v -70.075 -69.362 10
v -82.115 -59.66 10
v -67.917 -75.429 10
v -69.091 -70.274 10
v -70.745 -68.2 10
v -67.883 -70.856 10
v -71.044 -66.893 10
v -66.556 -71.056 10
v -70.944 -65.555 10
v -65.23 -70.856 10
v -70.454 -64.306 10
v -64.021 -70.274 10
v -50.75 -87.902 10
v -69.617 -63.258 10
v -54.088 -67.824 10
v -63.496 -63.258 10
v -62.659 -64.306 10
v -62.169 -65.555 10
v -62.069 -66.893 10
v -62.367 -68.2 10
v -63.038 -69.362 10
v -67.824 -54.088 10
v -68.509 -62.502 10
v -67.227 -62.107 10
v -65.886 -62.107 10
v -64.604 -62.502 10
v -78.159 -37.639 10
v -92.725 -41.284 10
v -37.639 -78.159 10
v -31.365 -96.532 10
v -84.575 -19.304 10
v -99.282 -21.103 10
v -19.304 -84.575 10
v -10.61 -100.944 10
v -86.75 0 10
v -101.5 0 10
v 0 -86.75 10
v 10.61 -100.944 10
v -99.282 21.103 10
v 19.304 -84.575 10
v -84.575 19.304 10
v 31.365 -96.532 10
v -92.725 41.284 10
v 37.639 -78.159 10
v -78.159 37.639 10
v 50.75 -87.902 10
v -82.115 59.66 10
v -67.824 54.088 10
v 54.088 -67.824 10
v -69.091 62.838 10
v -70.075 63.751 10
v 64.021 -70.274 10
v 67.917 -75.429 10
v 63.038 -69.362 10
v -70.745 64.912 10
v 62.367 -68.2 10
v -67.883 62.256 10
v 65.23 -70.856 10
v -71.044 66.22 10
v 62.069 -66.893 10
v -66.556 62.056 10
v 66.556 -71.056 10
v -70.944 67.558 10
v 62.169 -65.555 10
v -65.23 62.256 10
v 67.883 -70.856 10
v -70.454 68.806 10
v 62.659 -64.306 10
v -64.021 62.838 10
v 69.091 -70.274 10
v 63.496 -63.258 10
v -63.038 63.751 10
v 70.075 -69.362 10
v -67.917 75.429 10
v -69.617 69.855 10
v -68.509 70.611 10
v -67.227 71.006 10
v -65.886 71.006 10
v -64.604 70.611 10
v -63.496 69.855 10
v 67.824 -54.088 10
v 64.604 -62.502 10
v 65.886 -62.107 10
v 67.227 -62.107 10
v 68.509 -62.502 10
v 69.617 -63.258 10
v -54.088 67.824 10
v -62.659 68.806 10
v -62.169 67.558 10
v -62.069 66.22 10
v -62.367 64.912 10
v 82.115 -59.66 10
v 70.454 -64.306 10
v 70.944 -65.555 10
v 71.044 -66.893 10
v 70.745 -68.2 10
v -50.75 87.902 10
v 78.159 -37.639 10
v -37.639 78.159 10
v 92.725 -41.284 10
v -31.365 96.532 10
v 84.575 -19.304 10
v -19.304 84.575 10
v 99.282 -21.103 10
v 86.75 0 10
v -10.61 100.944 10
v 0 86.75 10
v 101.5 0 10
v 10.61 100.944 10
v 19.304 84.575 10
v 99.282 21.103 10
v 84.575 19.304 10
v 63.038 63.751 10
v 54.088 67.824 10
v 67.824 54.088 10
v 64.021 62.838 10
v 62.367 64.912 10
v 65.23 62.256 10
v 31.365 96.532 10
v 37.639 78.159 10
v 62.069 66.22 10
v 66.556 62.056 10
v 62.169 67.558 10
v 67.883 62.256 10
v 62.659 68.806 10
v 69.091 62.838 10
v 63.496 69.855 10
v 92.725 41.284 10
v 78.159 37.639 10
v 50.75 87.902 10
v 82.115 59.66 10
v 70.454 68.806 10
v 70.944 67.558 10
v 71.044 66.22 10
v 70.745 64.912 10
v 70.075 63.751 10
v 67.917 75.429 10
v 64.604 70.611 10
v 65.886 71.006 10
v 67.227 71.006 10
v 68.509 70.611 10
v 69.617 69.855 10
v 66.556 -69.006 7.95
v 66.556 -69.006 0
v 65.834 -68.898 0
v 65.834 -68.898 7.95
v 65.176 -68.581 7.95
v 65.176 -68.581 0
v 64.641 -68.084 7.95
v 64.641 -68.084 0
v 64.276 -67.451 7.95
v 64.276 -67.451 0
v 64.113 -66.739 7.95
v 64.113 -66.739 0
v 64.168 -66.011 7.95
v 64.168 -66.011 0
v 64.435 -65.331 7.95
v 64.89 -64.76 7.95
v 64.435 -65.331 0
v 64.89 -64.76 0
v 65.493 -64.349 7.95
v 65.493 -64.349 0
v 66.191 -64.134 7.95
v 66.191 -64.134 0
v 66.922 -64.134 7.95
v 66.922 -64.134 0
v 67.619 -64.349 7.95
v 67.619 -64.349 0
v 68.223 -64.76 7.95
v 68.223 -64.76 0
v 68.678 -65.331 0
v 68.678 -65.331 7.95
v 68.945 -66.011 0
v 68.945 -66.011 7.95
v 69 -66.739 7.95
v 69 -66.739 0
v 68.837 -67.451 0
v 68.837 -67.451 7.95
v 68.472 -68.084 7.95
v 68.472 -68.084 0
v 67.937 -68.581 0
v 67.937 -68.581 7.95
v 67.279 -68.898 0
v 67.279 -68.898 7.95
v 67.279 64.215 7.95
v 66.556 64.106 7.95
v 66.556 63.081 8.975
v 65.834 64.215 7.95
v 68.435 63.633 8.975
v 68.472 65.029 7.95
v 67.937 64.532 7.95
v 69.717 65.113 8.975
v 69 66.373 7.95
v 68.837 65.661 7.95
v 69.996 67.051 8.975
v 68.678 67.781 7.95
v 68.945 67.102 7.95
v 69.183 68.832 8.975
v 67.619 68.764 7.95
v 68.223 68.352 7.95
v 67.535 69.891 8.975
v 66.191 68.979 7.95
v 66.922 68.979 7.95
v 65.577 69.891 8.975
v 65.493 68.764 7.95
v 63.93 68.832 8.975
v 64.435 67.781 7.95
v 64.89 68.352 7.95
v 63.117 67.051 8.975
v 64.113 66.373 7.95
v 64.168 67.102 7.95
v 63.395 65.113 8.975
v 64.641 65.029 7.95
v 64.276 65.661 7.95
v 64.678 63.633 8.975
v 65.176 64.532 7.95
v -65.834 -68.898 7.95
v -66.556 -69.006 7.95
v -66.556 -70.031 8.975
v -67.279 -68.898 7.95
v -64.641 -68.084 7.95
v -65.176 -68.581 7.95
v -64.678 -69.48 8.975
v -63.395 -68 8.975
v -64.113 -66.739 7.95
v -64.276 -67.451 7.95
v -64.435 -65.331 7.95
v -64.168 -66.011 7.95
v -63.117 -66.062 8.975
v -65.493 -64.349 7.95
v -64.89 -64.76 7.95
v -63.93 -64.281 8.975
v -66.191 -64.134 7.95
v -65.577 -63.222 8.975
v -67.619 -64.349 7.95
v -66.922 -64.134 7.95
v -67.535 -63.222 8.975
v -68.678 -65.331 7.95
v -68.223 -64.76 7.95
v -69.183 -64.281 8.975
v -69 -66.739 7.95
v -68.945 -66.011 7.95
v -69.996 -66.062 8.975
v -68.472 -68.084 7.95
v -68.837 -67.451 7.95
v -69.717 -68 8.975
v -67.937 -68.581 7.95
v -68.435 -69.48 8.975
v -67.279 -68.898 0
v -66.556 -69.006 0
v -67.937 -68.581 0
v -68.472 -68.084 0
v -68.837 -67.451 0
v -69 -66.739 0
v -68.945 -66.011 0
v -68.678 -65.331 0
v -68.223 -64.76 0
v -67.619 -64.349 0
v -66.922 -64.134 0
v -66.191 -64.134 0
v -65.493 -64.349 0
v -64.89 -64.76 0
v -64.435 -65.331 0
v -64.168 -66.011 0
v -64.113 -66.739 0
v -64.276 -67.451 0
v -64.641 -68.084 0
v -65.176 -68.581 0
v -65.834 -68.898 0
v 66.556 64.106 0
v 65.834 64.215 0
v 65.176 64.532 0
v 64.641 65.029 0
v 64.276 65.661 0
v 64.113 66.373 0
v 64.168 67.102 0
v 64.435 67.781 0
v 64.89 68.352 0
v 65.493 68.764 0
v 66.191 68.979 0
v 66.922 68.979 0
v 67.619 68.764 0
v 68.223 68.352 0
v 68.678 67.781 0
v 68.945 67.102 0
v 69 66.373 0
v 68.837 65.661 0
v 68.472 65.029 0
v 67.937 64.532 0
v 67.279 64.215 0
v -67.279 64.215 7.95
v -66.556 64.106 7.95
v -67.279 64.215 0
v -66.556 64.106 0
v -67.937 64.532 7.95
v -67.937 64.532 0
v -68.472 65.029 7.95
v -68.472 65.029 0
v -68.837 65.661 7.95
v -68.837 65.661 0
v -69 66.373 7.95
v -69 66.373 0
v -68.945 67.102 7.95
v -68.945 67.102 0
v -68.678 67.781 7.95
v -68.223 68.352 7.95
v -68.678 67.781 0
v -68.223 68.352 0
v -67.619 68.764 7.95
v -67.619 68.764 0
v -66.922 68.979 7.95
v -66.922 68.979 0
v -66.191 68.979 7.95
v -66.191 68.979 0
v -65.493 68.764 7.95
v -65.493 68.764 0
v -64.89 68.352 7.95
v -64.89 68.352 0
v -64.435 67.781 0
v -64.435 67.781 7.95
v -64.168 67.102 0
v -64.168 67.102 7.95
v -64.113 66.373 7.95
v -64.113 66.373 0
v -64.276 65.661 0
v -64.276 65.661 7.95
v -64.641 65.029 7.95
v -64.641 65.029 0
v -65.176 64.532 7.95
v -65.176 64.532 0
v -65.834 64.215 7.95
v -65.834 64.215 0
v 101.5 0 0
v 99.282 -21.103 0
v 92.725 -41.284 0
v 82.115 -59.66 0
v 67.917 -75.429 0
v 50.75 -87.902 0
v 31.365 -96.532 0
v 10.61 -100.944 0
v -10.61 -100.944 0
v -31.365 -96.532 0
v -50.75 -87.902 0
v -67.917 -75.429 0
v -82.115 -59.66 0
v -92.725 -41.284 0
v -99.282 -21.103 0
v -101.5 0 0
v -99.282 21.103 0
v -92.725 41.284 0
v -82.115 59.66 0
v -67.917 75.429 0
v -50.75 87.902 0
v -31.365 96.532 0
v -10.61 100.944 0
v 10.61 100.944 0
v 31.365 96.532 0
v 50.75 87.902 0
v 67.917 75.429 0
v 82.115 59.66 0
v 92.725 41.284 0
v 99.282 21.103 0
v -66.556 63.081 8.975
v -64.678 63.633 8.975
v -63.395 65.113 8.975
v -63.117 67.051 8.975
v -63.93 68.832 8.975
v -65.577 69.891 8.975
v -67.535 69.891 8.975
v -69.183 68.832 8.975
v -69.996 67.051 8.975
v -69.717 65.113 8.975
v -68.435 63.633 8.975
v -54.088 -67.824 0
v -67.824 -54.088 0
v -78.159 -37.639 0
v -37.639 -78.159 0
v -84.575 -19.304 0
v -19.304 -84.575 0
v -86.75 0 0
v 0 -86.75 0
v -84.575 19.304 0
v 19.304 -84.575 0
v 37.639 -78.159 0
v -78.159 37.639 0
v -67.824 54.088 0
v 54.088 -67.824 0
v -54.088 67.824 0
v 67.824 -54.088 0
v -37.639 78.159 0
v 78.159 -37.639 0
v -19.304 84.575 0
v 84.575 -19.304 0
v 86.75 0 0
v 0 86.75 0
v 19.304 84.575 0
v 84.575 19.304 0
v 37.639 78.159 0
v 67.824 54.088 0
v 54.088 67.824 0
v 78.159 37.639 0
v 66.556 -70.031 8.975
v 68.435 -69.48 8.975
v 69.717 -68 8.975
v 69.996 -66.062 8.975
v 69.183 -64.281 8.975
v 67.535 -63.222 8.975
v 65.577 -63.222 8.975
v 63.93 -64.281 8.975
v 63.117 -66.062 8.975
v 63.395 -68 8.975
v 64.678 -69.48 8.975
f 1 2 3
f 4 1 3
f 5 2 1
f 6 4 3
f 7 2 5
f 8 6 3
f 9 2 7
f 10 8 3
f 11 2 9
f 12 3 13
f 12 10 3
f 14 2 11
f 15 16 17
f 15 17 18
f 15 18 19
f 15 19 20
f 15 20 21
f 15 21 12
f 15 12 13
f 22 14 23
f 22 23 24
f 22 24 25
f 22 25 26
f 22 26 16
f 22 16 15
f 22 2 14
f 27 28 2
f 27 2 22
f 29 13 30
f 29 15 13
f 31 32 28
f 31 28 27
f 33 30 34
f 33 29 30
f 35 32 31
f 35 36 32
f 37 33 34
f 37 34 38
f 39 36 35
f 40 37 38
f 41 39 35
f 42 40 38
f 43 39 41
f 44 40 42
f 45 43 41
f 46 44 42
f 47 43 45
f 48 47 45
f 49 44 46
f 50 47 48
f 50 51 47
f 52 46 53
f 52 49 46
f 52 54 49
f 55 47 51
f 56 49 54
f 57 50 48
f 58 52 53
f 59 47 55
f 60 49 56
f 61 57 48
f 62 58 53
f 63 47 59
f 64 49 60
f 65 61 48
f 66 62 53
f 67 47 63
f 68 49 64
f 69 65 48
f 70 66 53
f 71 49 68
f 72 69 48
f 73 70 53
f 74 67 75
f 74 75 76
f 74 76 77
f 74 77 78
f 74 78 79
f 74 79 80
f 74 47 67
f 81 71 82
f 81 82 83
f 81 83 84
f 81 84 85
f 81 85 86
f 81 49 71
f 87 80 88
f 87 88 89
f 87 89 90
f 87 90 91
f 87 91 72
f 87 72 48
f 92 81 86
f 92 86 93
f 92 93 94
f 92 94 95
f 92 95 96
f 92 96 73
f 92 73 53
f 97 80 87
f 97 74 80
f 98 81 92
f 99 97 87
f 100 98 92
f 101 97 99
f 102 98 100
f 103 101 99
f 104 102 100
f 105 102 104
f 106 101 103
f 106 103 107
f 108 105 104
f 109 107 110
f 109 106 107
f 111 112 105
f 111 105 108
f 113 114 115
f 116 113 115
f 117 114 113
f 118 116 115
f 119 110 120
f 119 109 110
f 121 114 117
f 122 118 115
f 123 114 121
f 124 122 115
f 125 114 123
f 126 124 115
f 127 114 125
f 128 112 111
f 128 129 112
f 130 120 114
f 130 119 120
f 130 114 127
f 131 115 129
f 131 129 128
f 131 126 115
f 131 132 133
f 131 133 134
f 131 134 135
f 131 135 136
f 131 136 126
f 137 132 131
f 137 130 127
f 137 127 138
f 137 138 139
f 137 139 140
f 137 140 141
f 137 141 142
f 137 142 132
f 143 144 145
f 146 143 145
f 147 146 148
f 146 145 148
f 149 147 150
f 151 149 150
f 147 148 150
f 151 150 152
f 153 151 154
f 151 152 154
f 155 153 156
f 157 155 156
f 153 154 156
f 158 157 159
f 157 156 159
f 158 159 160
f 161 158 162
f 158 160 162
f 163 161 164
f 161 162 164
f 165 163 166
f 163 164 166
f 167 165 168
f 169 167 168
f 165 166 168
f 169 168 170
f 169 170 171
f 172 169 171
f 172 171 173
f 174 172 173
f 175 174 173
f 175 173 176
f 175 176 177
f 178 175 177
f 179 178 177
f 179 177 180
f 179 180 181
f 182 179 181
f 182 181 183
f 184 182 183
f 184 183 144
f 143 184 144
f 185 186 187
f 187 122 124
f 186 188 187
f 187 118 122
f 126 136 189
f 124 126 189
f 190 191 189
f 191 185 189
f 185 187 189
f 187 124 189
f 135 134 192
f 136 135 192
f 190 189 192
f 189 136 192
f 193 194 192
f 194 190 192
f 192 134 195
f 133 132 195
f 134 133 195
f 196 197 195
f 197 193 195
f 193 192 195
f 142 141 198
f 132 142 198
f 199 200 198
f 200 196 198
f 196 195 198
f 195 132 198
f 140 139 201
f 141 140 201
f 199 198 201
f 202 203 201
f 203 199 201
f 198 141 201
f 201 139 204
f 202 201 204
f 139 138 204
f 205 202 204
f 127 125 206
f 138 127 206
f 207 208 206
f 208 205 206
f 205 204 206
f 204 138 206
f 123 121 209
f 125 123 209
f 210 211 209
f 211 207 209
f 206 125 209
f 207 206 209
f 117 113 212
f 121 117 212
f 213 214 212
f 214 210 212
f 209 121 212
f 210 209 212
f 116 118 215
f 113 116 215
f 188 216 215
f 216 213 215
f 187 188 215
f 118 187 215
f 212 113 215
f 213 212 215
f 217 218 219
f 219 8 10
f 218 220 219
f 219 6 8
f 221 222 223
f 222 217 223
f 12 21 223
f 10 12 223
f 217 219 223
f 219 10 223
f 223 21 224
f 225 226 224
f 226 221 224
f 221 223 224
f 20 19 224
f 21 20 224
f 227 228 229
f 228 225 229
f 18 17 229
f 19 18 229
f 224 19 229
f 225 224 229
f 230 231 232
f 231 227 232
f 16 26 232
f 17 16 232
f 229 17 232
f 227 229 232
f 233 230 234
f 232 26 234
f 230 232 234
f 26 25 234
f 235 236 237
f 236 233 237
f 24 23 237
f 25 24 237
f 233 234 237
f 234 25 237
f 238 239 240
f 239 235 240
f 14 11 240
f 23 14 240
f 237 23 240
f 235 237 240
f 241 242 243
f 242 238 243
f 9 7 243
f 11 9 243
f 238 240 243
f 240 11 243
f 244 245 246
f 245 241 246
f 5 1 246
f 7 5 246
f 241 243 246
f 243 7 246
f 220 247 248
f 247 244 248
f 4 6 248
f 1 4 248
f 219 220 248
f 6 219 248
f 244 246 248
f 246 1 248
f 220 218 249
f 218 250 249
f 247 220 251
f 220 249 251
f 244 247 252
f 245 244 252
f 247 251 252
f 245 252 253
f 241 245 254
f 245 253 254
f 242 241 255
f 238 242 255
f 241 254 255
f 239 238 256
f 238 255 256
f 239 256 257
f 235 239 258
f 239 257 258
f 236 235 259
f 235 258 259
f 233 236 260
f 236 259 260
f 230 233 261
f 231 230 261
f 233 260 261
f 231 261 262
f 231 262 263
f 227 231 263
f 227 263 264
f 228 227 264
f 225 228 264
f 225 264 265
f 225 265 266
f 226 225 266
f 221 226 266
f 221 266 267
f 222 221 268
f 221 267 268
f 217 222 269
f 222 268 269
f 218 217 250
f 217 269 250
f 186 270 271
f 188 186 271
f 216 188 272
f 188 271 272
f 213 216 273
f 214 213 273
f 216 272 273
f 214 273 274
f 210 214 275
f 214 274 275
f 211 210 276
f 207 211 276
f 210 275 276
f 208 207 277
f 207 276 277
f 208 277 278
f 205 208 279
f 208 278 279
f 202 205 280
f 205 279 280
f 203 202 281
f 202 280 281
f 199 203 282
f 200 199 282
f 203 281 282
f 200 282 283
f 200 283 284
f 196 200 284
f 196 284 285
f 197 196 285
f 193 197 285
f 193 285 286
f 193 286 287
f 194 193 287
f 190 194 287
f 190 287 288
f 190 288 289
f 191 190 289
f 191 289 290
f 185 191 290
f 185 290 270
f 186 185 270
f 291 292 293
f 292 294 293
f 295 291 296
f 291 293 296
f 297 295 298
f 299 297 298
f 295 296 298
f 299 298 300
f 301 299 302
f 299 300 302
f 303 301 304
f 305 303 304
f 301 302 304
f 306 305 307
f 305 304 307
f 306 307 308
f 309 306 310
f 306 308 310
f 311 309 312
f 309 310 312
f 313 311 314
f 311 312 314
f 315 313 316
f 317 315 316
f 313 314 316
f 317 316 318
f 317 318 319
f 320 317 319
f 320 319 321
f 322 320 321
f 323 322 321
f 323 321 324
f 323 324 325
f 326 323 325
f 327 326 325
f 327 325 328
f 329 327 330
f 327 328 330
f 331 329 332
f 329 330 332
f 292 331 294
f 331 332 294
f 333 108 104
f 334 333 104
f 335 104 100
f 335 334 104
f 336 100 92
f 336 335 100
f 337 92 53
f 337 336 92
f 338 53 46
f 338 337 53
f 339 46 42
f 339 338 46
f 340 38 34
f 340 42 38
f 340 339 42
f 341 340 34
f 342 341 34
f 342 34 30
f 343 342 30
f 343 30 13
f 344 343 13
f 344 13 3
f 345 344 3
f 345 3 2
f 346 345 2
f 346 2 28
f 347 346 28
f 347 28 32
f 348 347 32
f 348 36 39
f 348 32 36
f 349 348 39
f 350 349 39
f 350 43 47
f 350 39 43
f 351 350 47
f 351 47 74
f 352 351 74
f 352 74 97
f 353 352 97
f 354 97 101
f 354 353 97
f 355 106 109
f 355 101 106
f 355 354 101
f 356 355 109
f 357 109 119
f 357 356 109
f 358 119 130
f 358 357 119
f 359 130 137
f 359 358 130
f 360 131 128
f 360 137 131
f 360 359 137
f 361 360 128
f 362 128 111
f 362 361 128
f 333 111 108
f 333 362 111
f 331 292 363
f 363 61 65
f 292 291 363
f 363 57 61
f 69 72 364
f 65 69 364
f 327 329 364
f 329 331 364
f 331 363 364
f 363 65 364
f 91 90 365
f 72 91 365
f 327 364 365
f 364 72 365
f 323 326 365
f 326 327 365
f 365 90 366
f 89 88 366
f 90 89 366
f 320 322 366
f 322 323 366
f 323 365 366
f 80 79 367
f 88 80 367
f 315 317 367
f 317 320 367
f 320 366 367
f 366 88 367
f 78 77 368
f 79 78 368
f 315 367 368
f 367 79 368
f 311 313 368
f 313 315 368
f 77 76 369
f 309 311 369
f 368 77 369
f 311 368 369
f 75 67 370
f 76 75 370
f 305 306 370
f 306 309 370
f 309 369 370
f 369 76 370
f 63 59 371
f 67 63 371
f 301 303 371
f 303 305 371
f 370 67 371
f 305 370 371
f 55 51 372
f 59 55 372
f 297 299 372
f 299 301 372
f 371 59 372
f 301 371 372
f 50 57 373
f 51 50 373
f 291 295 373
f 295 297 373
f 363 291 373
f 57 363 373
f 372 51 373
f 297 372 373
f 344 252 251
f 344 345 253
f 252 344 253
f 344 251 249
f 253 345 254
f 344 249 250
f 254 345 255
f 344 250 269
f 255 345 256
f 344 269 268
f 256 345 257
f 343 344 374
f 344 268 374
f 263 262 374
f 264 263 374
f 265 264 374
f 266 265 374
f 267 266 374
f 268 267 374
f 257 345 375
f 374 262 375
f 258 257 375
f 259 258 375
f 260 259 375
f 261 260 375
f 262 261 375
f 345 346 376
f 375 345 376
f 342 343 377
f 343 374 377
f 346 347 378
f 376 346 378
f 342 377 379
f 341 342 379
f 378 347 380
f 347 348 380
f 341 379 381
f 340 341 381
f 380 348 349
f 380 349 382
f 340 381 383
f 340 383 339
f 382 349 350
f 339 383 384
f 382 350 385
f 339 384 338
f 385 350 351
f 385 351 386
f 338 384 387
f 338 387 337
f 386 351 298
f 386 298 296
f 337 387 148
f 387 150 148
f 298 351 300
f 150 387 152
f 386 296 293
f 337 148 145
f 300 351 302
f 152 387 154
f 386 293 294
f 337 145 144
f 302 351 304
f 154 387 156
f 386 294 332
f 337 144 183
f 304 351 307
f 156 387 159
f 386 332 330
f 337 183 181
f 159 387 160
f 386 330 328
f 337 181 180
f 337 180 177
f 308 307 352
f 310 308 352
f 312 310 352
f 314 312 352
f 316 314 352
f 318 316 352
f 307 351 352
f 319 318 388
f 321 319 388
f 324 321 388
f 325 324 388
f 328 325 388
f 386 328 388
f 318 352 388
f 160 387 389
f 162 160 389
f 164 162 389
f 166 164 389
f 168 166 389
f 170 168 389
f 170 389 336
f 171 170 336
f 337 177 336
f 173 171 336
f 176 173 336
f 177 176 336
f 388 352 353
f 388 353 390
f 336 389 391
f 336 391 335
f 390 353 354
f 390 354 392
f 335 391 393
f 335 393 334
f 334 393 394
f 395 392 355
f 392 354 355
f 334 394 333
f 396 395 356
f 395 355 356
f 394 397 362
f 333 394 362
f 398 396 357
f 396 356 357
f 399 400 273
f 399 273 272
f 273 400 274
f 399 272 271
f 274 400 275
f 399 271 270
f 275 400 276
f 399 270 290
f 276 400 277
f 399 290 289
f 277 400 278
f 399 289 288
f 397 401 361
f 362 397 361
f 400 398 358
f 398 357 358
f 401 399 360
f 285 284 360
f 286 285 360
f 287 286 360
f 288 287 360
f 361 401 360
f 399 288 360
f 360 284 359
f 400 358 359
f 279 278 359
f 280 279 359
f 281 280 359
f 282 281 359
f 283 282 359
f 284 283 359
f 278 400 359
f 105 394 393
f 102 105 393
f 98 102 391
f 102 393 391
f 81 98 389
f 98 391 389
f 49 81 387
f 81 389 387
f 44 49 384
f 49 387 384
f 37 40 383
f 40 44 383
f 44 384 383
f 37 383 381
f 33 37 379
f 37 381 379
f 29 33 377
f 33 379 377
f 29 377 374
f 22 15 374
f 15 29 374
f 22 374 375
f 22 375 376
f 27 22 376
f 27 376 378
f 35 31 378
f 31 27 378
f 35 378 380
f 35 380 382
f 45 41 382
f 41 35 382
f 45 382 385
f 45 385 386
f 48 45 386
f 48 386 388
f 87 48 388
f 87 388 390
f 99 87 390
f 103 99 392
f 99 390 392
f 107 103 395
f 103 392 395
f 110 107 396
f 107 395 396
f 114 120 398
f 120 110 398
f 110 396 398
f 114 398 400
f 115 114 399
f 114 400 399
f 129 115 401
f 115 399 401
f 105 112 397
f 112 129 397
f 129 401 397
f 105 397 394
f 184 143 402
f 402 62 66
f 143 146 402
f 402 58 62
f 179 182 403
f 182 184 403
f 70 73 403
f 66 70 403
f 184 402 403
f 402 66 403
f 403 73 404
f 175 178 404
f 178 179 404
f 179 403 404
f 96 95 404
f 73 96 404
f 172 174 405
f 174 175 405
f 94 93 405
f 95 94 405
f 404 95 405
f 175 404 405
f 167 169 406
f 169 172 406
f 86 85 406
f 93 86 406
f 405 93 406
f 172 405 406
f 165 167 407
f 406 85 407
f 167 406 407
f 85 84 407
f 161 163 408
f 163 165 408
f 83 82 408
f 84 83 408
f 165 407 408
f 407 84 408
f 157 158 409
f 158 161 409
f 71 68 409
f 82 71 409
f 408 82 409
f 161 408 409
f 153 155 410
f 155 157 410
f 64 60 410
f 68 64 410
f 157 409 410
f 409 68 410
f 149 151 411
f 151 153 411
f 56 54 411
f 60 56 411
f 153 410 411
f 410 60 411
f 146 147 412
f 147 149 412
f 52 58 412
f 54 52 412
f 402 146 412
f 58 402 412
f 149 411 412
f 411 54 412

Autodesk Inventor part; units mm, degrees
ref_plane "YZ Plane" through (0, 0, 0) normal (1, 0, 0) x (0, 1, 0)
ref_plane "XZ Plane" through (0, 0, 0) normal (0, 1, 0) x (-1, 0, 0)
ref_plane "XY Plane" through (0, 0, 0) normal (0, 0, 1) x (1, 0, 0)
sketch "Skizze1" plane through (0, 0, 0) normal (0, 0, 1) x (1, 0, 0)
  circle A0 centre (0, 0) radius 72
  circle A1 centre (0, 0) radius 101.5
  circle A2 centre (0, 0) radius 86.75
  dimension "d0" = 144
  dimension "d1" = 203
  dimension "d2" = 29.5
  dimension "d3" = 14.75
extrude "Extrusion1" add sketch "Skizze1" along normal blind 10 contours A1
sketch "Skizze2" plane through (0, 0, 10) normal (0, 0, 1) x (1, 0, 0)
  line L0 (-66.5564, -66.5564) -> (66.5564, -66.5564)
  line L1 (66.5564, -66.5564) -> (66.5564, 66.5564)
  line L2 (66.5564, 66.5564) -> (-66.5564, 66.5564)
  line L3 (-66.5564, 66.5564) -> (-66.5564, -66.5564)
  line L4 (-66.5564, -66.5564) -> (66.5564, 66.5564) construction
  line L5 (66.5564, -66.5564) -> (-66.5564, 66.5564) construction
  circle A0 centre (0, 0) radius 94.125 construction
  circle A1 centre (0, 0) radius 86.75 construction
  circle A2 centre (0, 0) radius 101.5 construction
  dimension "d15" = 14.75
  dimension "d16" = 7.375
hole "Bohrung1" at (-66.5564, 66.5564, 10) at (66.5564, 66.5564, 10) at (66.5564, -66.5564, 10) at (-66.5564, -66.5564, 10) direction (0, 0, -1) diameter 4.9 end through all countersink diameter 9 countersink angle 90
equation "\"d3\" = 0.5 * d2"
equation "\"d16\" = 0.5 * d15"
properties part number "Drehkranz_B" material "ABS-Kunststoff"
